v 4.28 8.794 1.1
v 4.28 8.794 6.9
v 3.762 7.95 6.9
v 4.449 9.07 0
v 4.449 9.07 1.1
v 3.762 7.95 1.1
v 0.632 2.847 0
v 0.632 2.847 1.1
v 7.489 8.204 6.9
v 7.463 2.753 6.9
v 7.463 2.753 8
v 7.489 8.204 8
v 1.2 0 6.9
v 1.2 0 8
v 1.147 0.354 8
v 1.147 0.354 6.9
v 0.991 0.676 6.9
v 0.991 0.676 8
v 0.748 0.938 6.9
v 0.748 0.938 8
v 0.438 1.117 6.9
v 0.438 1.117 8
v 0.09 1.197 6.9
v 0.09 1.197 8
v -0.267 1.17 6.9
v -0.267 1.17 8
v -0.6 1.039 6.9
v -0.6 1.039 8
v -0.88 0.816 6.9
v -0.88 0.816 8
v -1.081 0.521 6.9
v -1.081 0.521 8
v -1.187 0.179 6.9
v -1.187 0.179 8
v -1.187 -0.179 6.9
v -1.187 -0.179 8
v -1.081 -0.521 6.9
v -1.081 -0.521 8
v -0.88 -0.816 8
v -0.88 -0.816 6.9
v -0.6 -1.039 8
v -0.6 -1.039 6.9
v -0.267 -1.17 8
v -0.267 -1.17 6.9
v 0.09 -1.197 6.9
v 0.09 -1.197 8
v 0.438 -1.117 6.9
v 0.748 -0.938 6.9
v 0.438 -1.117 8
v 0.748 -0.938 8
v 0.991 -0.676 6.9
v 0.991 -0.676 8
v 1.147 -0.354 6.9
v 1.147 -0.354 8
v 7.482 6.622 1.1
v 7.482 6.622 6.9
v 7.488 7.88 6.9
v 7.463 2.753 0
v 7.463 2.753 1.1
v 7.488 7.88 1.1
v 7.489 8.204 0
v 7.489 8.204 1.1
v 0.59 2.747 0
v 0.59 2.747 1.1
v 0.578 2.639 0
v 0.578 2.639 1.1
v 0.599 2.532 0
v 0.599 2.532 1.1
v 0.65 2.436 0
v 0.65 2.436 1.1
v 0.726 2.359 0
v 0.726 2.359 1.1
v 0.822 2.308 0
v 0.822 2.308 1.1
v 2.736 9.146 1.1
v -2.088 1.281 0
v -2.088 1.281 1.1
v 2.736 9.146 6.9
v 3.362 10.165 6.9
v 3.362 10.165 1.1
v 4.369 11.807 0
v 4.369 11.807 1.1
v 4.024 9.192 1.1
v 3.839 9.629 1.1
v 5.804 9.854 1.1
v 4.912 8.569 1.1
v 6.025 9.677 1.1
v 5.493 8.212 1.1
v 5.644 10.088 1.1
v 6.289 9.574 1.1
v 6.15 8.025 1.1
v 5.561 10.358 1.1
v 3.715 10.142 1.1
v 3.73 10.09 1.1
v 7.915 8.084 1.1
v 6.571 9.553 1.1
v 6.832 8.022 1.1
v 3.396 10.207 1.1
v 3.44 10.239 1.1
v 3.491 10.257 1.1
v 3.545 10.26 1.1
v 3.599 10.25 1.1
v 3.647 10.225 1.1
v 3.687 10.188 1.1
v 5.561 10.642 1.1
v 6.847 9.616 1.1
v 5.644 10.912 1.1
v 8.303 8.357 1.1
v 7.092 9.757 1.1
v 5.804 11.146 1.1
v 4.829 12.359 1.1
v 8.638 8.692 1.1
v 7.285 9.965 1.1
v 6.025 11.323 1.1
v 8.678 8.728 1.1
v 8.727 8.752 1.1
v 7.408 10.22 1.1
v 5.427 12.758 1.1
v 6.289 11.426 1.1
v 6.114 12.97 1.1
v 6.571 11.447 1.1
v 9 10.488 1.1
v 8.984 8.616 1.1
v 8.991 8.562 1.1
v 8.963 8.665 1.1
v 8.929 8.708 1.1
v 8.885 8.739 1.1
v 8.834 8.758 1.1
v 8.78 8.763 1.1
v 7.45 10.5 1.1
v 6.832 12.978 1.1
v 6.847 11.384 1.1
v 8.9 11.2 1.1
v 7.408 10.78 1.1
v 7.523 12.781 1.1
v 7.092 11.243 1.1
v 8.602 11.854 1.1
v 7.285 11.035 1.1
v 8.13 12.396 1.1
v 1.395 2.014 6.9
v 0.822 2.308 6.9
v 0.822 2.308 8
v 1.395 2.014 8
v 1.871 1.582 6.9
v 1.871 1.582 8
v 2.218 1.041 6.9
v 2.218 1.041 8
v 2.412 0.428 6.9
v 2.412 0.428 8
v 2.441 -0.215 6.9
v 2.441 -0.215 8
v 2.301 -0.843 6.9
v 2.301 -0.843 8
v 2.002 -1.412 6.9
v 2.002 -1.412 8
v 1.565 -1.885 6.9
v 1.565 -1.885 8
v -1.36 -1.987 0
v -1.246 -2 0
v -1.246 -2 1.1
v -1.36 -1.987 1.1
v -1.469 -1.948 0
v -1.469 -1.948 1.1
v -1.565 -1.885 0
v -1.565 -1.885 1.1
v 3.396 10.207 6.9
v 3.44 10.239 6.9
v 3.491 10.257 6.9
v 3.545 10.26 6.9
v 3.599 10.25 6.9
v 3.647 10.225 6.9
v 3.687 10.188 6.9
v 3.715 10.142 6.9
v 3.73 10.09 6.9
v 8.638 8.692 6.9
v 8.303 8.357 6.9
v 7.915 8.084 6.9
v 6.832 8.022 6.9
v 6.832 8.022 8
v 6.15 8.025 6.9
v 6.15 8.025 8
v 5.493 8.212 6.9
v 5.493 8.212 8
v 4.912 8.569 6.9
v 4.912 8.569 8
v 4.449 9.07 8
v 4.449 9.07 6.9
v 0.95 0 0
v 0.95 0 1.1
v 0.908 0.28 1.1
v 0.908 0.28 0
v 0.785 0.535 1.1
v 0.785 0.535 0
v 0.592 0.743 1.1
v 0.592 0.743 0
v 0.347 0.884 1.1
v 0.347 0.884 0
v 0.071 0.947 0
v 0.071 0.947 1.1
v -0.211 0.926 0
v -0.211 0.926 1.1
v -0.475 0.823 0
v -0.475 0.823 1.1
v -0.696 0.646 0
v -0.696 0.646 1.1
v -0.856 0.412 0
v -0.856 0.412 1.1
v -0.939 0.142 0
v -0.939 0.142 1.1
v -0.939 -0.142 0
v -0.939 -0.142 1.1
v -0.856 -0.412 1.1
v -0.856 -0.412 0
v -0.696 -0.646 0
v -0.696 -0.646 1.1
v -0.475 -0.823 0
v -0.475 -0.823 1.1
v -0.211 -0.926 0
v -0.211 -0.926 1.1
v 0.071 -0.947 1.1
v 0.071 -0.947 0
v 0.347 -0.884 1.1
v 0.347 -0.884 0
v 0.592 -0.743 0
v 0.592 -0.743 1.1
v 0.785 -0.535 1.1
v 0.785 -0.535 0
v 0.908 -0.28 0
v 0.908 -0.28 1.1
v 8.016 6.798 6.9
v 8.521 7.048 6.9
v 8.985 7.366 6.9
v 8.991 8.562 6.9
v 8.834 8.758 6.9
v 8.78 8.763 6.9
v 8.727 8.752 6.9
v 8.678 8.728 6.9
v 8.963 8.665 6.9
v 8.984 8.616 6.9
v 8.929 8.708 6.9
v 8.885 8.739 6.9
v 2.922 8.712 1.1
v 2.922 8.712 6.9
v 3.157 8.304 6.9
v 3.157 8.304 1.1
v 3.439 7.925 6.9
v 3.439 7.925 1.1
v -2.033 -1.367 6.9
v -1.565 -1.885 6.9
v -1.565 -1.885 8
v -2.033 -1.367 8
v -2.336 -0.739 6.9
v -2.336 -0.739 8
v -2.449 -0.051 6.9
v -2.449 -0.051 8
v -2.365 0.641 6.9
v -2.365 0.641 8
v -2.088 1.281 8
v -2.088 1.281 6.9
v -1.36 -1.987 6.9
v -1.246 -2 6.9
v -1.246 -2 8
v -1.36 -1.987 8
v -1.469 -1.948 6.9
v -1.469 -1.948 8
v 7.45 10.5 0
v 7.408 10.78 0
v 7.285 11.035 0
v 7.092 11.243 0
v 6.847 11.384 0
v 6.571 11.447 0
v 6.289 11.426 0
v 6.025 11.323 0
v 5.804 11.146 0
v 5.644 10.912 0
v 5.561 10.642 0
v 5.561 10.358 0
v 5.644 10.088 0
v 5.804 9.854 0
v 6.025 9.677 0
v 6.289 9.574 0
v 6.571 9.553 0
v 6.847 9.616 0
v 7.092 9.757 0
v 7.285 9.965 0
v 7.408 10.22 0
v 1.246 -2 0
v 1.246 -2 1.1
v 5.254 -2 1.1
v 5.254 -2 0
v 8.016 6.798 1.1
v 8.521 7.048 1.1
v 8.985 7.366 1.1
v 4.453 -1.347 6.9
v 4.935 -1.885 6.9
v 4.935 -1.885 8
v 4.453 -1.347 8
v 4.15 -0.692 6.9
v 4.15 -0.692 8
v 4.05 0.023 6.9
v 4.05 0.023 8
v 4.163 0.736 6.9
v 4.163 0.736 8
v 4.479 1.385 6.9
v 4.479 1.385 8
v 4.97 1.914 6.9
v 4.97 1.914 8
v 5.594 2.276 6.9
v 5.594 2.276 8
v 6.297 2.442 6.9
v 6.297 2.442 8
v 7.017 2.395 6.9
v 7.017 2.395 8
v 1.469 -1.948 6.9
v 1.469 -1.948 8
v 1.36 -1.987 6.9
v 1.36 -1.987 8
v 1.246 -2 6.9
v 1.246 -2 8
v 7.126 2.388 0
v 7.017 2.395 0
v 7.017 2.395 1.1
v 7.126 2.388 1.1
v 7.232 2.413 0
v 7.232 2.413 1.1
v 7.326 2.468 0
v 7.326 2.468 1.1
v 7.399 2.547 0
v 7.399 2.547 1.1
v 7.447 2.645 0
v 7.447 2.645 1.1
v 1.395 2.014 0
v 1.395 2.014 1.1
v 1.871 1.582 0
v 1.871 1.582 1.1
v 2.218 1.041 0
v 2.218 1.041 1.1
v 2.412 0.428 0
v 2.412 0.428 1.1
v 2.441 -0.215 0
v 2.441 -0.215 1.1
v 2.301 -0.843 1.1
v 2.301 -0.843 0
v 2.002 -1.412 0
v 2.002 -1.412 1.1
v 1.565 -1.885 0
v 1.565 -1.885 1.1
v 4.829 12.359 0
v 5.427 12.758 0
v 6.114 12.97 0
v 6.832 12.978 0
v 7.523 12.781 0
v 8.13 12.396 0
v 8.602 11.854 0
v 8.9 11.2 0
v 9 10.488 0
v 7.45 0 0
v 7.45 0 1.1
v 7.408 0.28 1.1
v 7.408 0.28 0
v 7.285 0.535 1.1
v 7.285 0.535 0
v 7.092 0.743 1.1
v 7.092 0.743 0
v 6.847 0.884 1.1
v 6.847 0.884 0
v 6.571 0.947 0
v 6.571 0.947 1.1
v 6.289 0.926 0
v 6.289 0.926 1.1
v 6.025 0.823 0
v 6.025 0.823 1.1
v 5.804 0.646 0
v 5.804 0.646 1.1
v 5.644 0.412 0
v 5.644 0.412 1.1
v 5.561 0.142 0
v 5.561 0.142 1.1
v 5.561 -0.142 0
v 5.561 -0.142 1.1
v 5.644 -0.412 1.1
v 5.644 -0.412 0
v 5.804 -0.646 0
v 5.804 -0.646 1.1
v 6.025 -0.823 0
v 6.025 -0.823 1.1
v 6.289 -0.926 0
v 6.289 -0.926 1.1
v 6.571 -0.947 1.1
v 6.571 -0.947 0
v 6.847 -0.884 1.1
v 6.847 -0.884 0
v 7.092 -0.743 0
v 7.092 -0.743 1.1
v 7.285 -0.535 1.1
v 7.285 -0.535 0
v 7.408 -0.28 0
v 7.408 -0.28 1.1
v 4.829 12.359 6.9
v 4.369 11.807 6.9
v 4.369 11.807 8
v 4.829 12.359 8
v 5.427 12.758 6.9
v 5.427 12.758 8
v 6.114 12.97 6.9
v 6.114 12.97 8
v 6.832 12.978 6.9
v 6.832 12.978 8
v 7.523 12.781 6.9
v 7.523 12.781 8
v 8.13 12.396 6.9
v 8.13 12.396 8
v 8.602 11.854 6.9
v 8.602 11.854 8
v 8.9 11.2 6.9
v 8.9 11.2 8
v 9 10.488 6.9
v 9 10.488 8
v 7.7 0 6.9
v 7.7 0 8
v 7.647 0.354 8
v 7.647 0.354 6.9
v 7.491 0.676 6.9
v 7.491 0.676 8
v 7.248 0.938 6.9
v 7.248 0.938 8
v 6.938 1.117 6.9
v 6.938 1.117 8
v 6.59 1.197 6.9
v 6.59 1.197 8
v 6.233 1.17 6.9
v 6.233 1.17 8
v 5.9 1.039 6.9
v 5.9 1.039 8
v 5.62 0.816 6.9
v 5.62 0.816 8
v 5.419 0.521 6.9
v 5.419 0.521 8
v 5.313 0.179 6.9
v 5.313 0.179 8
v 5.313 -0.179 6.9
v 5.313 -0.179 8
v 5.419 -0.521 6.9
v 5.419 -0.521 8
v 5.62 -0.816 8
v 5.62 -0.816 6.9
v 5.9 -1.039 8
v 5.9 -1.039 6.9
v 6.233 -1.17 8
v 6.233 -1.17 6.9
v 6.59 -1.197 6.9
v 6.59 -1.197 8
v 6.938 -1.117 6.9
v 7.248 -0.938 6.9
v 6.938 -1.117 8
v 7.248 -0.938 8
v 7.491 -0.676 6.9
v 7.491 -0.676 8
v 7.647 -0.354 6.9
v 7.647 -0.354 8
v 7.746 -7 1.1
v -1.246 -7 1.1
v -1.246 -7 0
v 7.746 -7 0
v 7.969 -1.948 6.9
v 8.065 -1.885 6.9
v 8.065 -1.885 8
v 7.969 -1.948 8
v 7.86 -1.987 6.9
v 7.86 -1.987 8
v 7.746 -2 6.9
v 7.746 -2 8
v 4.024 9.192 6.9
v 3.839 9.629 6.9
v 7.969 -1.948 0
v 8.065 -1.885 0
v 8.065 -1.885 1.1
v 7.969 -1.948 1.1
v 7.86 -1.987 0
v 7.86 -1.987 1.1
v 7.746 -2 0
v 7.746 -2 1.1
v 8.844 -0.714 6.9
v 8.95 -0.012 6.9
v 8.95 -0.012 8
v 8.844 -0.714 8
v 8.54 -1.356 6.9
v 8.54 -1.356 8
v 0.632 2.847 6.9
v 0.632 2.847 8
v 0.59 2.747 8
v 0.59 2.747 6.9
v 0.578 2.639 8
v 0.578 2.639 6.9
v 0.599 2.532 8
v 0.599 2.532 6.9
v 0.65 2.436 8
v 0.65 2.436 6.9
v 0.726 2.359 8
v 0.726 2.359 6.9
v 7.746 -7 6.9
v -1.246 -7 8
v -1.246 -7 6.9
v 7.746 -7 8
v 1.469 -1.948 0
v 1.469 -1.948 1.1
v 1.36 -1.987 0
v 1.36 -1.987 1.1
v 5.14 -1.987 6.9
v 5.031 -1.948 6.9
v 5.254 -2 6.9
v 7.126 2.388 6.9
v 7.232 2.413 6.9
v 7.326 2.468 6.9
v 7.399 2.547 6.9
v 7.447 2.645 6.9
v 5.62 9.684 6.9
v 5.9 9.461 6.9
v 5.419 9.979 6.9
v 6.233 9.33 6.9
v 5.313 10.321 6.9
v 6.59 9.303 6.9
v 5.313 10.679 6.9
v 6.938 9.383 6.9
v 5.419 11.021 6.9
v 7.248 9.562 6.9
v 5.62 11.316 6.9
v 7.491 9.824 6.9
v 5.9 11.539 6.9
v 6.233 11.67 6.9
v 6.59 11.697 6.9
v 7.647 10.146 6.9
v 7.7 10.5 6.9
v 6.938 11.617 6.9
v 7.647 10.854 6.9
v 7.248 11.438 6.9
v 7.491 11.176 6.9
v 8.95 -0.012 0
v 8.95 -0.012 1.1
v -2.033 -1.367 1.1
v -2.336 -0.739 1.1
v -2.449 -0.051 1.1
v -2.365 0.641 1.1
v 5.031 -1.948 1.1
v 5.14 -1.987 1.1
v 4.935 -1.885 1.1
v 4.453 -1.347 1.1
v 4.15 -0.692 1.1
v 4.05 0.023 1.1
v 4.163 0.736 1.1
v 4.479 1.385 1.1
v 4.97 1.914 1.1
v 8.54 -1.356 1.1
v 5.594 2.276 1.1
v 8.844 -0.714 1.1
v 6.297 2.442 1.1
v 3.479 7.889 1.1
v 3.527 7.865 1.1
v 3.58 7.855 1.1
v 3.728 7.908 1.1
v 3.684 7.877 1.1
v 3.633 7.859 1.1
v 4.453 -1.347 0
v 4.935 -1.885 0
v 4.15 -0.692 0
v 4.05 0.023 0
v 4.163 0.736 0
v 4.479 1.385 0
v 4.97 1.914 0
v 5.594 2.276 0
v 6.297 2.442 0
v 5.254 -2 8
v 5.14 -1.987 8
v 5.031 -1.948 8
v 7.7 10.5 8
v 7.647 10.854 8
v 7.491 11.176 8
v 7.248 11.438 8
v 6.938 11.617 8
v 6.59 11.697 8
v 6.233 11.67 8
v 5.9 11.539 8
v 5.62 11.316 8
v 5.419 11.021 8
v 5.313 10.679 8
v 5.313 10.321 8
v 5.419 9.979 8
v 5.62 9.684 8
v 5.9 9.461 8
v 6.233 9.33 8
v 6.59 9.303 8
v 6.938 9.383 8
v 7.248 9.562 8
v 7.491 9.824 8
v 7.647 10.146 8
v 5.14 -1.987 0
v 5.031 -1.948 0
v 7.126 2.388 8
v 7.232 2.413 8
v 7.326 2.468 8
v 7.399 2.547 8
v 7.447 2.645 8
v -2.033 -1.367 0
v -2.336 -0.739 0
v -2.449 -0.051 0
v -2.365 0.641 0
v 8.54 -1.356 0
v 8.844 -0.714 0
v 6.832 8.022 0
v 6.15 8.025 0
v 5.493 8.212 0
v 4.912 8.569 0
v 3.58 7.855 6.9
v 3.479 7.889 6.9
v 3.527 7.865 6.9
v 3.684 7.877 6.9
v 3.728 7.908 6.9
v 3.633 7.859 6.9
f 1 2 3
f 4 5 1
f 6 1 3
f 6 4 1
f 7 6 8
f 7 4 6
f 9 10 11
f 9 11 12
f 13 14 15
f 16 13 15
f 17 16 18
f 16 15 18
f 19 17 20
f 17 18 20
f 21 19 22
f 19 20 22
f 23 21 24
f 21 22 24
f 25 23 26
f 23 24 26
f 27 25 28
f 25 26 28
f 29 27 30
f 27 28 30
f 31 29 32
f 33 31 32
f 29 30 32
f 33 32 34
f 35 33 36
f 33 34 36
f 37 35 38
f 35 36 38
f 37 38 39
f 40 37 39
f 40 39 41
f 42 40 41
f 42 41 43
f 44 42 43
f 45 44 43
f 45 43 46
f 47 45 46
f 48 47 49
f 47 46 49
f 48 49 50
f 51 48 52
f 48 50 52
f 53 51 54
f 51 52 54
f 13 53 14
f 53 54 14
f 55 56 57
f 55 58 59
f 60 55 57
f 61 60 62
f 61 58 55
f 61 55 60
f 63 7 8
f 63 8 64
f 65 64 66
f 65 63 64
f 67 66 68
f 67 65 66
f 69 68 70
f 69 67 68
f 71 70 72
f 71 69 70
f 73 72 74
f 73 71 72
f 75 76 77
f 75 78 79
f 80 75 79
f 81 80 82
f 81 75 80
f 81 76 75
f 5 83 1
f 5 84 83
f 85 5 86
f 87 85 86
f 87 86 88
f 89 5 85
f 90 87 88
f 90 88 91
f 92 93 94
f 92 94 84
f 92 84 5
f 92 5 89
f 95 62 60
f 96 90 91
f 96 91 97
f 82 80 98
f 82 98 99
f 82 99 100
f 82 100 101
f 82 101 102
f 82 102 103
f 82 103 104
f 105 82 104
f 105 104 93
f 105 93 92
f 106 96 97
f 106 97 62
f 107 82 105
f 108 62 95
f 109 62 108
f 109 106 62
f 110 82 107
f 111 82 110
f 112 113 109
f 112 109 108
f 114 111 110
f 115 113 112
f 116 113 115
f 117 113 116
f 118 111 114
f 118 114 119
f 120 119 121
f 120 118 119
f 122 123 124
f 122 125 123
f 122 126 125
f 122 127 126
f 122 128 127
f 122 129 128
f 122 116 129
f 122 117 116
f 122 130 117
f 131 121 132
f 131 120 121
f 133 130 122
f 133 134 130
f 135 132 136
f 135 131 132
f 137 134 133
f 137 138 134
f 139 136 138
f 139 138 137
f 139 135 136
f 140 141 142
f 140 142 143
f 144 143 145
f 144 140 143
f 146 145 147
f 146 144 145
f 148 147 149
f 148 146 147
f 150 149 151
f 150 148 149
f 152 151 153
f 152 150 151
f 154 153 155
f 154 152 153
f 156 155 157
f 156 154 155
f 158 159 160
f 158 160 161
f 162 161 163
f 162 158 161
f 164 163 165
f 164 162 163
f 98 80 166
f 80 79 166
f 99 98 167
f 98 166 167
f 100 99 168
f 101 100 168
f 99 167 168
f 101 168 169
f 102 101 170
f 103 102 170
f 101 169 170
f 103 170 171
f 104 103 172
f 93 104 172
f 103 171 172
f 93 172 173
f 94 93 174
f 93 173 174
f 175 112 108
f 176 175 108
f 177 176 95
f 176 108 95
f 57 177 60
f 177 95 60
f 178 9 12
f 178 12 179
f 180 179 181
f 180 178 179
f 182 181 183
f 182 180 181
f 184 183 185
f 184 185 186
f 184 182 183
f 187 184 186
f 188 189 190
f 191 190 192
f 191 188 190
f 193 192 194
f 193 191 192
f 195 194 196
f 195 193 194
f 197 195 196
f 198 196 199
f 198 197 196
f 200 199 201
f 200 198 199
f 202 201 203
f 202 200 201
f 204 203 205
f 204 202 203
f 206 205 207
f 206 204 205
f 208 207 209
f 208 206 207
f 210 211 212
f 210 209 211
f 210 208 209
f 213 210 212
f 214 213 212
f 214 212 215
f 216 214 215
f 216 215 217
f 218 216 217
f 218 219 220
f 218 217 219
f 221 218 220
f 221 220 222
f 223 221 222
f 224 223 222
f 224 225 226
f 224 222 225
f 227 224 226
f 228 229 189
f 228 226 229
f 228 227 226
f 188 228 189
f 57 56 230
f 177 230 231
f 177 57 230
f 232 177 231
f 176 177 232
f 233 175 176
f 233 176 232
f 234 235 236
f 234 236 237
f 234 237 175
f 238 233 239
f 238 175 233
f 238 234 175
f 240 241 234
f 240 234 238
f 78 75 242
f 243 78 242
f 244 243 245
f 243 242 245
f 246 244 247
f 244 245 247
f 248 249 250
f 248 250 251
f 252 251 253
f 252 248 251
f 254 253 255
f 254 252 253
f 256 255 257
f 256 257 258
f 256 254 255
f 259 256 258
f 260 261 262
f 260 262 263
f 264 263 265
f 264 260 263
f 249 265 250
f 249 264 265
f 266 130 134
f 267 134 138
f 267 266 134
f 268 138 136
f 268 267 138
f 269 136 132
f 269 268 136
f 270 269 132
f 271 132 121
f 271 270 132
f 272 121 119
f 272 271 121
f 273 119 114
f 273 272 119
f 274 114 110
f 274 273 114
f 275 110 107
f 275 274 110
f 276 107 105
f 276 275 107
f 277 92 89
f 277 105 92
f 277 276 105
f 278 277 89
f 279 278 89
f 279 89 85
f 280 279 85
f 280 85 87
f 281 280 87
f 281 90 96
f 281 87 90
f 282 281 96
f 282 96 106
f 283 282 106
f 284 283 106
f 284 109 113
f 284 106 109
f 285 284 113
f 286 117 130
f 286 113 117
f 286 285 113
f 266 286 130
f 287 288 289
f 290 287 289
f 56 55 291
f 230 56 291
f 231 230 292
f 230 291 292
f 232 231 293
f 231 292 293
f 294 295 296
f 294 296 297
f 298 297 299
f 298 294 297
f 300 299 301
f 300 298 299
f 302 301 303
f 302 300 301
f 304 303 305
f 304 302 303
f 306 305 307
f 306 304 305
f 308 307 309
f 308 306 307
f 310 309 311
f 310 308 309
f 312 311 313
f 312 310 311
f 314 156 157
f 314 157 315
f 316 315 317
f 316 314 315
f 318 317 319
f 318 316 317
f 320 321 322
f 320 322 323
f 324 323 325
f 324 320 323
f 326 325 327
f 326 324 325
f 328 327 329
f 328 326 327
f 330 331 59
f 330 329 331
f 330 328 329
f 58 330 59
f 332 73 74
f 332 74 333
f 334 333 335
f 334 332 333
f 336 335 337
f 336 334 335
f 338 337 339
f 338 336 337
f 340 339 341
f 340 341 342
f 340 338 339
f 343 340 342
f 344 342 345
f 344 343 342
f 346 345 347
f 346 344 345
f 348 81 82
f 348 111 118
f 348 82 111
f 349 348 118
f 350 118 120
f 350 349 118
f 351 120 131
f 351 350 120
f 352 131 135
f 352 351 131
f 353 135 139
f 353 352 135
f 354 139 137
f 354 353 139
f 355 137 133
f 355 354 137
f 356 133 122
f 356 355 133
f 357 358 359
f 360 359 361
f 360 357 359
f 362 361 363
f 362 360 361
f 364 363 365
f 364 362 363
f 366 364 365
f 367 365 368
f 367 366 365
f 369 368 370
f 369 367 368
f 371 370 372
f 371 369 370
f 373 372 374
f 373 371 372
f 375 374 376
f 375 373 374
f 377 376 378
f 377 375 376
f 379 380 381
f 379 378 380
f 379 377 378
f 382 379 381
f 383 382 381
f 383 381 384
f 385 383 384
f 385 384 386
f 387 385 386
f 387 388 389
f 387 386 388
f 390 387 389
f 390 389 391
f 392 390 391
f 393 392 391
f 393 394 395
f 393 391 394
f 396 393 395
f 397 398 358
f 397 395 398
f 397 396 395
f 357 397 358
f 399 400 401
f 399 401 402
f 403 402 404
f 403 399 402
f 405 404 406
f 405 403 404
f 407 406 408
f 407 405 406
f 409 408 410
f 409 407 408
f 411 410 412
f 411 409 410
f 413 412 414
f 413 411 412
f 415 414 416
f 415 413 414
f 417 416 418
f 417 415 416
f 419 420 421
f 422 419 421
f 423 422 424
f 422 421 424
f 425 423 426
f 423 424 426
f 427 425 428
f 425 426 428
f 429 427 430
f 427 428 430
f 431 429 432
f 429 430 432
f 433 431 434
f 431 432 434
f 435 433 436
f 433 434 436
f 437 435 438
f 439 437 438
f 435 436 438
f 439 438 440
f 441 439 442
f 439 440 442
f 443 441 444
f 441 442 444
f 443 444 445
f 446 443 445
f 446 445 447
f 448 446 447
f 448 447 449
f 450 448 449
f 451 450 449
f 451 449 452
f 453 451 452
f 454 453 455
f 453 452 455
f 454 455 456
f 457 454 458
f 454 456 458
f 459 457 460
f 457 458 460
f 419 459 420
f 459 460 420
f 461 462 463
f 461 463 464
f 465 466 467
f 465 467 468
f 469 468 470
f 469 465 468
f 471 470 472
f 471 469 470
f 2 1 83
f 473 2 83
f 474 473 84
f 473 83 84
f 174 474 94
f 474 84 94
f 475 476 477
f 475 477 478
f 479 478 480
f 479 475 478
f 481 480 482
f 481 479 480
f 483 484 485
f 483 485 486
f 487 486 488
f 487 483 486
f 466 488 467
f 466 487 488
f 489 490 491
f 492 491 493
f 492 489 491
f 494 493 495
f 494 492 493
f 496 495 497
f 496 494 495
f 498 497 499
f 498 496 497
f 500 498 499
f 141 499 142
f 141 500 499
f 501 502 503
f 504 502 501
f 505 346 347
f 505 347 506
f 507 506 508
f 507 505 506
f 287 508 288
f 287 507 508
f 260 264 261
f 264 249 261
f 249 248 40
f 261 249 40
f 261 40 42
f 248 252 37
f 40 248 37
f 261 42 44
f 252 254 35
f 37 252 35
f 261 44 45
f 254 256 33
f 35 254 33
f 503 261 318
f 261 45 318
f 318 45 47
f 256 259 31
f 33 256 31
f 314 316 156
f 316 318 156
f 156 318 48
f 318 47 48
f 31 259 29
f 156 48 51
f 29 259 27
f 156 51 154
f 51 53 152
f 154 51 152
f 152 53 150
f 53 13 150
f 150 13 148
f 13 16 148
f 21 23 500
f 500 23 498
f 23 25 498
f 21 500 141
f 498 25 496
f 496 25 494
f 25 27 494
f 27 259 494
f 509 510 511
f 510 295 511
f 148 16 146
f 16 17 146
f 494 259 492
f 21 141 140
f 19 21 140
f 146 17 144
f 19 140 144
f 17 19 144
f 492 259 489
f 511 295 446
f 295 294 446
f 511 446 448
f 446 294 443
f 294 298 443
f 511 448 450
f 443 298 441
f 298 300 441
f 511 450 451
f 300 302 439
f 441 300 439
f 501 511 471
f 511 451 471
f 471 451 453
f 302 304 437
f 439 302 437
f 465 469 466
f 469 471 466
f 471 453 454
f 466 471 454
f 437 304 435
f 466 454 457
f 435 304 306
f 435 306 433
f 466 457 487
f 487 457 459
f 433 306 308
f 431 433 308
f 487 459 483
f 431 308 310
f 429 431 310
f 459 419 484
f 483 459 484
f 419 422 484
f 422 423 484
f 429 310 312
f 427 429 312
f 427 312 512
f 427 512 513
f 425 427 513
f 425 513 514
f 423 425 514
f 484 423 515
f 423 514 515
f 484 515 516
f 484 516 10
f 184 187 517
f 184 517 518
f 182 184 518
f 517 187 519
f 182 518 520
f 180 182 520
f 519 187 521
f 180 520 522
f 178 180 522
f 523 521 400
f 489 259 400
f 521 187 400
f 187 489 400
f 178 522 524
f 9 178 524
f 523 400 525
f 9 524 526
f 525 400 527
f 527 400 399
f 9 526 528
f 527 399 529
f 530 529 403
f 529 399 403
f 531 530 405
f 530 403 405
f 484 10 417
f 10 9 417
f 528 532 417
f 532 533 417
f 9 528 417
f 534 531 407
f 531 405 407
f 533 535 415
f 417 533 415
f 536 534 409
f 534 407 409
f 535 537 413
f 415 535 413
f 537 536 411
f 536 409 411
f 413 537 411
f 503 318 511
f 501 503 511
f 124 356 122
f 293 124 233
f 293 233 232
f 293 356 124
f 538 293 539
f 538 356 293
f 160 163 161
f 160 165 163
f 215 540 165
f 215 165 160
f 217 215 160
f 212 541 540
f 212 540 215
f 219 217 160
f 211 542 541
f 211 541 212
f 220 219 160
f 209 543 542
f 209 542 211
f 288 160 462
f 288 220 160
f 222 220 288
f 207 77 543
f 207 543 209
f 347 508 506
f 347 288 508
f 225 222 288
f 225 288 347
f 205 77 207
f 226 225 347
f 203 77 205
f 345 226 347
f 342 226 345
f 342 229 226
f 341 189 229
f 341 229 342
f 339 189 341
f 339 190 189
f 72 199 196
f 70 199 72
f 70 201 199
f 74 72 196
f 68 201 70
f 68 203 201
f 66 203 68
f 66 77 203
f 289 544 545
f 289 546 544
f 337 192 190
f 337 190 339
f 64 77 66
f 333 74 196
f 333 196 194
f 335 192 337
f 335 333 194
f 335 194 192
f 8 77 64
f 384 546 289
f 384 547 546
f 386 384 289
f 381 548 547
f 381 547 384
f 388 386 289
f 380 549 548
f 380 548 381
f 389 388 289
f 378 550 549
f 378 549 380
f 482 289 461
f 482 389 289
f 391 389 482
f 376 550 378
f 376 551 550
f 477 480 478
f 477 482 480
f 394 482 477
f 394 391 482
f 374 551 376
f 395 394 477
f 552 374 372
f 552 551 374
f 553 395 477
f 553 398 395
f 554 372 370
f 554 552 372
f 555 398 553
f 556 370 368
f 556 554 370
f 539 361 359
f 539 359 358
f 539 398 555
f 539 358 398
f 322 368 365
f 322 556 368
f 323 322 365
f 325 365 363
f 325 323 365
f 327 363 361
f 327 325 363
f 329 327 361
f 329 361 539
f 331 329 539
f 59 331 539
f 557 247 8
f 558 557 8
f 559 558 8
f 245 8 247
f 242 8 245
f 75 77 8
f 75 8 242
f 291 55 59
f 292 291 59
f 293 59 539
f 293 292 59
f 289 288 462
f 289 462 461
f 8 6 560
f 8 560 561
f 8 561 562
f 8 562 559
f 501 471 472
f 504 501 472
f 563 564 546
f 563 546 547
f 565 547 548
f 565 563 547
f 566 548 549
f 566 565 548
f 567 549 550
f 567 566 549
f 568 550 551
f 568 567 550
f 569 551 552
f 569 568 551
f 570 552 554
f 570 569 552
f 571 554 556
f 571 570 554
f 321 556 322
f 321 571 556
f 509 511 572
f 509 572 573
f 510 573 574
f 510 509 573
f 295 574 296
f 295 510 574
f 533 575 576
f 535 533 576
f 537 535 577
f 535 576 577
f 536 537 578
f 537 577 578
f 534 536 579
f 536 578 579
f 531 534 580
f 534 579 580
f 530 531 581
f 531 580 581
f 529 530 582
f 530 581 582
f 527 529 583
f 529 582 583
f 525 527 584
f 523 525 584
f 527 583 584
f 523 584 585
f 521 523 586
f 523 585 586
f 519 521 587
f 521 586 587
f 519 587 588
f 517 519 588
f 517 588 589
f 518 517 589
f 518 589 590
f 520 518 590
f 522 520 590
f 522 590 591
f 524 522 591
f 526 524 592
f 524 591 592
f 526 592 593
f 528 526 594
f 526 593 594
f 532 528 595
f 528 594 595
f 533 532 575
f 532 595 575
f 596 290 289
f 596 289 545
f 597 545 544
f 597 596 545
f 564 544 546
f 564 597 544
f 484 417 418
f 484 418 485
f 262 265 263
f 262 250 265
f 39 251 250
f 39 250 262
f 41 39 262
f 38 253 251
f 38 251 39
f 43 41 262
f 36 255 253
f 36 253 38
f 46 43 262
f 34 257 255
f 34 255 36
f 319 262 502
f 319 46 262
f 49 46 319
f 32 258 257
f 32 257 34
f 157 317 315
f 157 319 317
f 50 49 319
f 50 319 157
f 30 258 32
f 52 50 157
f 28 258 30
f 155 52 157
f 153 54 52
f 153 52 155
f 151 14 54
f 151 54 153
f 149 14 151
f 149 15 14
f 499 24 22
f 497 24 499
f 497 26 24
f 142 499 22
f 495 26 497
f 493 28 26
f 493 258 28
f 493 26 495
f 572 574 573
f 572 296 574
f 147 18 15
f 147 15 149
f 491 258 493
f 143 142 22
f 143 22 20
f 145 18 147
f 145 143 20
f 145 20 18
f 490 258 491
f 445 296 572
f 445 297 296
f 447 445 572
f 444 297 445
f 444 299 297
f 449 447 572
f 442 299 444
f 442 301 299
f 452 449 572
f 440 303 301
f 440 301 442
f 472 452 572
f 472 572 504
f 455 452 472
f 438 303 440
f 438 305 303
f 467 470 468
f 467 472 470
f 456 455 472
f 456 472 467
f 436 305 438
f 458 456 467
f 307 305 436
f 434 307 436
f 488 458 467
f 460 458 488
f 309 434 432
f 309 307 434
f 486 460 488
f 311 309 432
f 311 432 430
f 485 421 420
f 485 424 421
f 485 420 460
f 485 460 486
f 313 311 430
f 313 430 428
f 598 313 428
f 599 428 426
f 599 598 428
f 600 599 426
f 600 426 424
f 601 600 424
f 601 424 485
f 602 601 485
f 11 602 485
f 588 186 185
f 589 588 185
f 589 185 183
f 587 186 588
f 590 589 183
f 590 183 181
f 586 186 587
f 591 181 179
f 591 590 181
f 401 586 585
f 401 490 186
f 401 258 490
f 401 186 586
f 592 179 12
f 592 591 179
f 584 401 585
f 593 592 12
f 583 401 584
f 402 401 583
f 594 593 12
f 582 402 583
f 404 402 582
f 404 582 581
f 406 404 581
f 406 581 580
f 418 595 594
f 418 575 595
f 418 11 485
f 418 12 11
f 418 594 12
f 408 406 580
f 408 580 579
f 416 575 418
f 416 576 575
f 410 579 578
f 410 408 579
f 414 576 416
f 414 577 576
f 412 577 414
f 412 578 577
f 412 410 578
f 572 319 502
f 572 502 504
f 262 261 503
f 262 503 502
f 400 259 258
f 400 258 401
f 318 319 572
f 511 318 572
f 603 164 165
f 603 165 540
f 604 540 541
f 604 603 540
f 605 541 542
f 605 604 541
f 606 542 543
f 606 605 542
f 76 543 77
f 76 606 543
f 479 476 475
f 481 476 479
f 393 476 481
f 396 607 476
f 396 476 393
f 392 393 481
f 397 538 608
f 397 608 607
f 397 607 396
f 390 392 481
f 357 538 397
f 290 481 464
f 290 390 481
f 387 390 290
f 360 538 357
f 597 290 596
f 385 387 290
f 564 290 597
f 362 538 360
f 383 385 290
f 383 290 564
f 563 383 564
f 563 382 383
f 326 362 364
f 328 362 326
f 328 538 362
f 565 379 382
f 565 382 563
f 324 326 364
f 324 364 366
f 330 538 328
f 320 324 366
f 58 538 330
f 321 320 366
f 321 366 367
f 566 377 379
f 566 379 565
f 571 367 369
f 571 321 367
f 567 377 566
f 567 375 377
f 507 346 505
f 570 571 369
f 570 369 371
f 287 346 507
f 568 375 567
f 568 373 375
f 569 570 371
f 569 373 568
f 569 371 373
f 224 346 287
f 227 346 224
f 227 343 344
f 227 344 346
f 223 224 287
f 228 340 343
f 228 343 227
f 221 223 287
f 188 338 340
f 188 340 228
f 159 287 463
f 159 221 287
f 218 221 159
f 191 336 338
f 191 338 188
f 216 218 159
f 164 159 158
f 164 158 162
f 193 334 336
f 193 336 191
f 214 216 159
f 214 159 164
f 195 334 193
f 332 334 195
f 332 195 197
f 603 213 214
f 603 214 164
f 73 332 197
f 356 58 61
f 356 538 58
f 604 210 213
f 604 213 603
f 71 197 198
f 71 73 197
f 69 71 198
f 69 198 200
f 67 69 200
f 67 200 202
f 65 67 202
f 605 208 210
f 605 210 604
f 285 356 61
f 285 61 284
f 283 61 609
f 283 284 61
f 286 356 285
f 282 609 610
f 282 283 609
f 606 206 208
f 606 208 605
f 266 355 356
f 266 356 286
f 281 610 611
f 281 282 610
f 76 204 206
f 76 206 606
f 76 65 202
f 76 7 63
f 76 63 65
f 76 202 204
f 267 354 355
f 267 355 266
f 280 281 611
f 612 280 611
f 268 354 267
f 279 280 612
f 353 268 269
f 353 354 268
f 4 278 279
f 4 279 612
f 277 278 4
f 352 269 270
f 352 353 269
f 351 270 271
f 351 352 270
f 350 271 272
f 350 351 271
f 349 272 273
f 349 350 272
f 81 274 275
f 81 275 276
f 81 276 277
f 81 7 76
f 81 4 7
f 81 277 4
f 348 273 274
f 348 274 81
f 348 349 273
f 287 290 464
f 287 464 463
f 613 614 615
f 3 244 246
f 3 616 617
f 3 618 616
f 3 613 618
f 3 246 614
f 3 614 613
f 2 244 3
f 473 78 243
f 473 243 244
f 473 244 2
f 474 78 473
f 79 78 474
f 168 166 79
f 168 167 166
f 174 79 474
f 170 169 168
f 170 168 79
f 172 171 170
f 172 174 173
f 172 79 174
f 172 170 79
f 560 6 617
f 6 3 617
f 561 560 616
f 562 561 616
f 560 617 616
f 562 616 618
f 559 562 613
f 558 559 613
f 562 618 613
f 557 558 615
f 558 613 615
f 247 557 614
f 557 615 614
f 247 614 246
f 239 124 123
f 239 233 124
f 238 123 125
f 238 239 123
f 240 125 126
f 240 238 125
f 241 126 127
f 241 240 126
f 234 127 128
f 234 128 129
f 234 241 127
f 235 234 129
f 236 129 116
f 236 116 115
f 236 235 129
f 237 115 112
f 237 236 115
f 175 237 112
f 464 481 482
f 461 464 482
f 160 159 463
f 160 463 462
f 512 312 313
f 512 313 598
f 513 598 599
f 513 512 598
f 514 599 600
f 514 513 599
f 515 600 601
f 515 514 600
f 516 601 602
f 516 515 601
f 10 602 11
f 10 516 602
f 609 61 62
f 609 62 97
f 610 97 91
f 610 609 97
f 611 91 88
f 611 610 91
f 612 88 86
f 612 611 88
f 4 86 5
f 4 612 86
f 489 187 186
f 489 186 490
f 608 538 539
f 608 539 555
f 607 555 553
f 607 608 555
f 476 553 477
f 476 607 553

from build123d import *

# Parameters (mm, degrees)
HOUSING_R           = 0.9499999999999998
HOUSING_R_2         = 0.9500000000000001
HOUSING_R_3         = 0.95
BOSS_EXTRUDE1_DEPTH = 8
CUT_EXTRUDE1_DEPTH  = 2.9
BOSS_EXTRUDE2_DEPTH = 5.8
FILLET1_R           = 0.2
SKETCH4_R           = 1.1999999999999995
SKETCH4_R_2         = 1.2
CUT_EXTRUDE2_DEPTH  = 1.1
SKETCH5_W           = 8.991987158875418
SKETCH5_H           = 1.1000000000000005
SKETCH5_H_2         = 1.1000000000000003
BOSS_EXTRUDE3_DEPTH = 5


# Read off the part's stored shape, not the designer's step: Split1
with BuildPart() as part:
    # housing → Boss-Extrude1 (new body)
    with BuildSketch(Plane.XY):
        with BuildLine():
            ThreePointArc((7.017292273195786, 2.3947669414980512), (7.325518035981619, 2.4675712154204676), (7.463119607499124, 2.752824419893601))
            Line((7.463119607499124, 2.752824419893601), (7.489077767555448, 8.203976226227727))
            ThreePointArc((7.489077767555448, 8.203976226227727), (5.815094951659767, 8.095648720598838), (4.449478668914345, 9.069838375999874))
            Line((4.449478668914345, 9.069838375999874), (0.6320850471381863, 2.847123137185346))
            ThreePointArc((0.6320850471381863, 2.847123137185346), (0.5987139537613061, 2.5321787718236037), (0.8223068369271714, 2.3078802971434254))
            ThreePointArc((0.8223068369271714, 2.3078802971434254), (2.412392058852269, 0.42762665303569264), (1.5654791126268672, -1.8846153846153846))
            ThreePointArc((1.5654791126268672, -1.8846153846153846), (1.415835134559399, -1.9702699715629801), (1.2459935794377088, -2))
            Line((1.2459935794377088, -2), (-1.2459935794377088, -2))
            ThreePointArc((-1.2459935794377088, -2), (-1.4158351345593991, -1.9702699715629806), (-1.5654791126268672, -1.8846153846153846))
            ThreePointArc((-1.5654791126268672, -1.8846153846153846), (-2.4172505006690987, -0.3992493168622683), (-2.0883538457938933, 1.2811238093009794))
            Line((-2.0883538457938933, 1.2811238093009794), (4.369026687965414, 11.80726919316428))
            ThreePointArc((4.369026687965414, 11.80726919316428), (7.184905048340233, 12.90435127940119), (8.999971655168114, 10.488095238095253))
            Line((8.999971655168114, 10.488095238095253), (8.94997222206475, -0.01166666666666699))
            ThreePointArc((8.94997222206475, -0.01166666666666699), (8.715388584500609, -1.046209070723625), (8.065479112626866, -1.8846153846153848))
            ThreePointArc((8.065479112626866, -1.8846153846153848), (7.915835134559398, -1.9702699715629803), (7.745993579437708, -2))
            Line((7.745993579437708, -2), (5.254006420562291, -2))
            ThreePointArc((5.254006420562291, -2), (5.084164865440601, -1.9702699715629801), (4.934520887373134, -1.8846153846153848))
            ThreePointArc((4.934520887373134, -1.8846153846153848), (4.297058288140121, 1.0721696760064878), (7.017292273195786, 2.3947669414980512))
        make_face()
        with Locations((6.5, 10.500000000000014)):
            Circle(HOUSING_R, mode=Mode.SUBTRACT)
        with Locations((6.5, 1.73e-15)):
            Circle(HOUSING_R_2, mode=Mode.SUBTRACT)
        Circle(HOUSING_R_3, mode=Mode.SUBTRACT)
    extrude(amount=BOSS_EXTRUDE1_DEPTH)

    # Sketch2 → Cut-Extrude1 (cut, symmetric)
    with BuildSketch(Plane.XY.offset(4)):
        Polygon((9.299999999999999, 13.000000000000002), (-2.700000000000002, 13), (-2.700000000000001, -3.0000000000000004), (9.3, -2.999999999999999), align=None)
    extrude(amount=CUT_EXTRUDE1_DEPTH, both=True, mode=Mode.SUBTRACT)


with BuildPart() as cut_extrude1_piece_1:
    # of the separate pieces the step leaves, piece 1, a body of its own (cut_extrude1_pieces)
    add(part.part.solids().sort_by_distance((7.017292273, 2.394766941, 0))[0])



with BuildPart() as cut_extrude1_piece_2:
    # of the separate pieces the step leaves, piece 2, a body of its own (cut_extrude1_pieces)
    add(part.part.solids().sort_by_distance((7.463119607, 2.75282442, 6.9))[0])


with BuildPart() as cut_extrude1_piece_1_1:
    add(cut_extrude1_piece_1.part)

    add(cut_extrude1_piece_2.part)  # Boss-Extrude2 merges Cut-Extrude1 piece 2
    # Sketch3 → Boss-Extrude2 (add)
    with BuildSketch(Plane.XY.offset(1.1000000000000003)):
        with BuildLine():
            Line((8.985102612314783, 7.365631641579735), (8.993967121733391, 9.227157513392633))
            ThreePointArc((8.993967121733391, 9.227157513392633), (8.366539647651873, 8.41288961869681), (7.4875346650857, 7.879928381655572))
            Line((7.4875346650857, 7.879928381655572), (7.481545884228164, 6.622298660655433))
            ThreePointArc((7.481545884228164, 6.622298660655433), (8.272723590912673, 6.914271193993949), (8.985102612314783, 7.365631641579735))
        make_face()
        with BuildLine():
            Line((3.6223979495320817, 7.721618017776758), (4.280029641984488, 8.7936203208159))
            ThreePointArc((4.280029641984488, 8.7936203208159), (3.8138220786436623, 9.709779666917052), (3.7096651953681965, 10.732447151112684))
            Line((3.7096651953681965, 10.732447151112684), (2.7362479890296694, 9.145684379505001))
            ThreePointArc((2.7362479890296694, 9.145684379505001), (3.1038422897343154, 8.38668203835701), (3.6223979495320817, 7.721618017776758))
        make_face()
    extrude(amount=BOSS_EXTRUDE2_DEPTH)

    # Fillet1
    fillet1_edges = [cut_extrude1_piece_1_1.edges().sort_by_distance(p)[0] for p in [
        (8.993967121733391, 9.227157513392633, 4),
        (3.6223979495320817, 7.721618017776759, 4),
        (3.7096651953681965, 10.732447151112684, 4),
    ]]
    fillet(fillet1_edges, radius=FILLET1_R)

    # Sketch4 → Cut-Extrude2 (cut)
    with BuildSketch(Plane.XY.offset(8)):
        with Locations((6.5, 10.500000000000014)):
            Circle(SKETCH4_R)
        Circle(SKETCH4_R_2)
        with Locations((6.5, 1.73e-15)):
            Circle(SKETCH4_R)
    extrude(amount=-CUT_EXTRUDE2_DEPTH, mode=Mode.SUBTRACT)

    # Sketch5 → Boss-Extrude3 (add)
    with BuildSketch(Plane.XZ.offset(2)):
        with Locations((3.2499999999999996, 7.449999999999999)):
            Rectangle(SKETCH5_W, SKETCH5_H)
        with Locations((3.2499999999999996, 0.5500000000000002)):
            Rectangle(SKETCH5_W, SKETCH5_H_2)
    extrude(amount=BOSS_EXTRUDE3_DEPTH)


with BuildPart() as body_2:
    # Split1: the piece on the far side of the plane
    add(cut_extrude1_piece_1_1.part)
    split(bisect_by=Plane.XY.offset(6.9), keep=Keep.BOTTOM)


with BuildPart() as cut_extrude1_piece_1_2:
    add(cut_extrude1_piece_1_1.part)

    # Split1
    split(bisect_by=Plane.XY.offset(6.9), keep=Keep.TOP)


solid = Compound([body_2.part, cut_extrude1_piece_1_2.part])
